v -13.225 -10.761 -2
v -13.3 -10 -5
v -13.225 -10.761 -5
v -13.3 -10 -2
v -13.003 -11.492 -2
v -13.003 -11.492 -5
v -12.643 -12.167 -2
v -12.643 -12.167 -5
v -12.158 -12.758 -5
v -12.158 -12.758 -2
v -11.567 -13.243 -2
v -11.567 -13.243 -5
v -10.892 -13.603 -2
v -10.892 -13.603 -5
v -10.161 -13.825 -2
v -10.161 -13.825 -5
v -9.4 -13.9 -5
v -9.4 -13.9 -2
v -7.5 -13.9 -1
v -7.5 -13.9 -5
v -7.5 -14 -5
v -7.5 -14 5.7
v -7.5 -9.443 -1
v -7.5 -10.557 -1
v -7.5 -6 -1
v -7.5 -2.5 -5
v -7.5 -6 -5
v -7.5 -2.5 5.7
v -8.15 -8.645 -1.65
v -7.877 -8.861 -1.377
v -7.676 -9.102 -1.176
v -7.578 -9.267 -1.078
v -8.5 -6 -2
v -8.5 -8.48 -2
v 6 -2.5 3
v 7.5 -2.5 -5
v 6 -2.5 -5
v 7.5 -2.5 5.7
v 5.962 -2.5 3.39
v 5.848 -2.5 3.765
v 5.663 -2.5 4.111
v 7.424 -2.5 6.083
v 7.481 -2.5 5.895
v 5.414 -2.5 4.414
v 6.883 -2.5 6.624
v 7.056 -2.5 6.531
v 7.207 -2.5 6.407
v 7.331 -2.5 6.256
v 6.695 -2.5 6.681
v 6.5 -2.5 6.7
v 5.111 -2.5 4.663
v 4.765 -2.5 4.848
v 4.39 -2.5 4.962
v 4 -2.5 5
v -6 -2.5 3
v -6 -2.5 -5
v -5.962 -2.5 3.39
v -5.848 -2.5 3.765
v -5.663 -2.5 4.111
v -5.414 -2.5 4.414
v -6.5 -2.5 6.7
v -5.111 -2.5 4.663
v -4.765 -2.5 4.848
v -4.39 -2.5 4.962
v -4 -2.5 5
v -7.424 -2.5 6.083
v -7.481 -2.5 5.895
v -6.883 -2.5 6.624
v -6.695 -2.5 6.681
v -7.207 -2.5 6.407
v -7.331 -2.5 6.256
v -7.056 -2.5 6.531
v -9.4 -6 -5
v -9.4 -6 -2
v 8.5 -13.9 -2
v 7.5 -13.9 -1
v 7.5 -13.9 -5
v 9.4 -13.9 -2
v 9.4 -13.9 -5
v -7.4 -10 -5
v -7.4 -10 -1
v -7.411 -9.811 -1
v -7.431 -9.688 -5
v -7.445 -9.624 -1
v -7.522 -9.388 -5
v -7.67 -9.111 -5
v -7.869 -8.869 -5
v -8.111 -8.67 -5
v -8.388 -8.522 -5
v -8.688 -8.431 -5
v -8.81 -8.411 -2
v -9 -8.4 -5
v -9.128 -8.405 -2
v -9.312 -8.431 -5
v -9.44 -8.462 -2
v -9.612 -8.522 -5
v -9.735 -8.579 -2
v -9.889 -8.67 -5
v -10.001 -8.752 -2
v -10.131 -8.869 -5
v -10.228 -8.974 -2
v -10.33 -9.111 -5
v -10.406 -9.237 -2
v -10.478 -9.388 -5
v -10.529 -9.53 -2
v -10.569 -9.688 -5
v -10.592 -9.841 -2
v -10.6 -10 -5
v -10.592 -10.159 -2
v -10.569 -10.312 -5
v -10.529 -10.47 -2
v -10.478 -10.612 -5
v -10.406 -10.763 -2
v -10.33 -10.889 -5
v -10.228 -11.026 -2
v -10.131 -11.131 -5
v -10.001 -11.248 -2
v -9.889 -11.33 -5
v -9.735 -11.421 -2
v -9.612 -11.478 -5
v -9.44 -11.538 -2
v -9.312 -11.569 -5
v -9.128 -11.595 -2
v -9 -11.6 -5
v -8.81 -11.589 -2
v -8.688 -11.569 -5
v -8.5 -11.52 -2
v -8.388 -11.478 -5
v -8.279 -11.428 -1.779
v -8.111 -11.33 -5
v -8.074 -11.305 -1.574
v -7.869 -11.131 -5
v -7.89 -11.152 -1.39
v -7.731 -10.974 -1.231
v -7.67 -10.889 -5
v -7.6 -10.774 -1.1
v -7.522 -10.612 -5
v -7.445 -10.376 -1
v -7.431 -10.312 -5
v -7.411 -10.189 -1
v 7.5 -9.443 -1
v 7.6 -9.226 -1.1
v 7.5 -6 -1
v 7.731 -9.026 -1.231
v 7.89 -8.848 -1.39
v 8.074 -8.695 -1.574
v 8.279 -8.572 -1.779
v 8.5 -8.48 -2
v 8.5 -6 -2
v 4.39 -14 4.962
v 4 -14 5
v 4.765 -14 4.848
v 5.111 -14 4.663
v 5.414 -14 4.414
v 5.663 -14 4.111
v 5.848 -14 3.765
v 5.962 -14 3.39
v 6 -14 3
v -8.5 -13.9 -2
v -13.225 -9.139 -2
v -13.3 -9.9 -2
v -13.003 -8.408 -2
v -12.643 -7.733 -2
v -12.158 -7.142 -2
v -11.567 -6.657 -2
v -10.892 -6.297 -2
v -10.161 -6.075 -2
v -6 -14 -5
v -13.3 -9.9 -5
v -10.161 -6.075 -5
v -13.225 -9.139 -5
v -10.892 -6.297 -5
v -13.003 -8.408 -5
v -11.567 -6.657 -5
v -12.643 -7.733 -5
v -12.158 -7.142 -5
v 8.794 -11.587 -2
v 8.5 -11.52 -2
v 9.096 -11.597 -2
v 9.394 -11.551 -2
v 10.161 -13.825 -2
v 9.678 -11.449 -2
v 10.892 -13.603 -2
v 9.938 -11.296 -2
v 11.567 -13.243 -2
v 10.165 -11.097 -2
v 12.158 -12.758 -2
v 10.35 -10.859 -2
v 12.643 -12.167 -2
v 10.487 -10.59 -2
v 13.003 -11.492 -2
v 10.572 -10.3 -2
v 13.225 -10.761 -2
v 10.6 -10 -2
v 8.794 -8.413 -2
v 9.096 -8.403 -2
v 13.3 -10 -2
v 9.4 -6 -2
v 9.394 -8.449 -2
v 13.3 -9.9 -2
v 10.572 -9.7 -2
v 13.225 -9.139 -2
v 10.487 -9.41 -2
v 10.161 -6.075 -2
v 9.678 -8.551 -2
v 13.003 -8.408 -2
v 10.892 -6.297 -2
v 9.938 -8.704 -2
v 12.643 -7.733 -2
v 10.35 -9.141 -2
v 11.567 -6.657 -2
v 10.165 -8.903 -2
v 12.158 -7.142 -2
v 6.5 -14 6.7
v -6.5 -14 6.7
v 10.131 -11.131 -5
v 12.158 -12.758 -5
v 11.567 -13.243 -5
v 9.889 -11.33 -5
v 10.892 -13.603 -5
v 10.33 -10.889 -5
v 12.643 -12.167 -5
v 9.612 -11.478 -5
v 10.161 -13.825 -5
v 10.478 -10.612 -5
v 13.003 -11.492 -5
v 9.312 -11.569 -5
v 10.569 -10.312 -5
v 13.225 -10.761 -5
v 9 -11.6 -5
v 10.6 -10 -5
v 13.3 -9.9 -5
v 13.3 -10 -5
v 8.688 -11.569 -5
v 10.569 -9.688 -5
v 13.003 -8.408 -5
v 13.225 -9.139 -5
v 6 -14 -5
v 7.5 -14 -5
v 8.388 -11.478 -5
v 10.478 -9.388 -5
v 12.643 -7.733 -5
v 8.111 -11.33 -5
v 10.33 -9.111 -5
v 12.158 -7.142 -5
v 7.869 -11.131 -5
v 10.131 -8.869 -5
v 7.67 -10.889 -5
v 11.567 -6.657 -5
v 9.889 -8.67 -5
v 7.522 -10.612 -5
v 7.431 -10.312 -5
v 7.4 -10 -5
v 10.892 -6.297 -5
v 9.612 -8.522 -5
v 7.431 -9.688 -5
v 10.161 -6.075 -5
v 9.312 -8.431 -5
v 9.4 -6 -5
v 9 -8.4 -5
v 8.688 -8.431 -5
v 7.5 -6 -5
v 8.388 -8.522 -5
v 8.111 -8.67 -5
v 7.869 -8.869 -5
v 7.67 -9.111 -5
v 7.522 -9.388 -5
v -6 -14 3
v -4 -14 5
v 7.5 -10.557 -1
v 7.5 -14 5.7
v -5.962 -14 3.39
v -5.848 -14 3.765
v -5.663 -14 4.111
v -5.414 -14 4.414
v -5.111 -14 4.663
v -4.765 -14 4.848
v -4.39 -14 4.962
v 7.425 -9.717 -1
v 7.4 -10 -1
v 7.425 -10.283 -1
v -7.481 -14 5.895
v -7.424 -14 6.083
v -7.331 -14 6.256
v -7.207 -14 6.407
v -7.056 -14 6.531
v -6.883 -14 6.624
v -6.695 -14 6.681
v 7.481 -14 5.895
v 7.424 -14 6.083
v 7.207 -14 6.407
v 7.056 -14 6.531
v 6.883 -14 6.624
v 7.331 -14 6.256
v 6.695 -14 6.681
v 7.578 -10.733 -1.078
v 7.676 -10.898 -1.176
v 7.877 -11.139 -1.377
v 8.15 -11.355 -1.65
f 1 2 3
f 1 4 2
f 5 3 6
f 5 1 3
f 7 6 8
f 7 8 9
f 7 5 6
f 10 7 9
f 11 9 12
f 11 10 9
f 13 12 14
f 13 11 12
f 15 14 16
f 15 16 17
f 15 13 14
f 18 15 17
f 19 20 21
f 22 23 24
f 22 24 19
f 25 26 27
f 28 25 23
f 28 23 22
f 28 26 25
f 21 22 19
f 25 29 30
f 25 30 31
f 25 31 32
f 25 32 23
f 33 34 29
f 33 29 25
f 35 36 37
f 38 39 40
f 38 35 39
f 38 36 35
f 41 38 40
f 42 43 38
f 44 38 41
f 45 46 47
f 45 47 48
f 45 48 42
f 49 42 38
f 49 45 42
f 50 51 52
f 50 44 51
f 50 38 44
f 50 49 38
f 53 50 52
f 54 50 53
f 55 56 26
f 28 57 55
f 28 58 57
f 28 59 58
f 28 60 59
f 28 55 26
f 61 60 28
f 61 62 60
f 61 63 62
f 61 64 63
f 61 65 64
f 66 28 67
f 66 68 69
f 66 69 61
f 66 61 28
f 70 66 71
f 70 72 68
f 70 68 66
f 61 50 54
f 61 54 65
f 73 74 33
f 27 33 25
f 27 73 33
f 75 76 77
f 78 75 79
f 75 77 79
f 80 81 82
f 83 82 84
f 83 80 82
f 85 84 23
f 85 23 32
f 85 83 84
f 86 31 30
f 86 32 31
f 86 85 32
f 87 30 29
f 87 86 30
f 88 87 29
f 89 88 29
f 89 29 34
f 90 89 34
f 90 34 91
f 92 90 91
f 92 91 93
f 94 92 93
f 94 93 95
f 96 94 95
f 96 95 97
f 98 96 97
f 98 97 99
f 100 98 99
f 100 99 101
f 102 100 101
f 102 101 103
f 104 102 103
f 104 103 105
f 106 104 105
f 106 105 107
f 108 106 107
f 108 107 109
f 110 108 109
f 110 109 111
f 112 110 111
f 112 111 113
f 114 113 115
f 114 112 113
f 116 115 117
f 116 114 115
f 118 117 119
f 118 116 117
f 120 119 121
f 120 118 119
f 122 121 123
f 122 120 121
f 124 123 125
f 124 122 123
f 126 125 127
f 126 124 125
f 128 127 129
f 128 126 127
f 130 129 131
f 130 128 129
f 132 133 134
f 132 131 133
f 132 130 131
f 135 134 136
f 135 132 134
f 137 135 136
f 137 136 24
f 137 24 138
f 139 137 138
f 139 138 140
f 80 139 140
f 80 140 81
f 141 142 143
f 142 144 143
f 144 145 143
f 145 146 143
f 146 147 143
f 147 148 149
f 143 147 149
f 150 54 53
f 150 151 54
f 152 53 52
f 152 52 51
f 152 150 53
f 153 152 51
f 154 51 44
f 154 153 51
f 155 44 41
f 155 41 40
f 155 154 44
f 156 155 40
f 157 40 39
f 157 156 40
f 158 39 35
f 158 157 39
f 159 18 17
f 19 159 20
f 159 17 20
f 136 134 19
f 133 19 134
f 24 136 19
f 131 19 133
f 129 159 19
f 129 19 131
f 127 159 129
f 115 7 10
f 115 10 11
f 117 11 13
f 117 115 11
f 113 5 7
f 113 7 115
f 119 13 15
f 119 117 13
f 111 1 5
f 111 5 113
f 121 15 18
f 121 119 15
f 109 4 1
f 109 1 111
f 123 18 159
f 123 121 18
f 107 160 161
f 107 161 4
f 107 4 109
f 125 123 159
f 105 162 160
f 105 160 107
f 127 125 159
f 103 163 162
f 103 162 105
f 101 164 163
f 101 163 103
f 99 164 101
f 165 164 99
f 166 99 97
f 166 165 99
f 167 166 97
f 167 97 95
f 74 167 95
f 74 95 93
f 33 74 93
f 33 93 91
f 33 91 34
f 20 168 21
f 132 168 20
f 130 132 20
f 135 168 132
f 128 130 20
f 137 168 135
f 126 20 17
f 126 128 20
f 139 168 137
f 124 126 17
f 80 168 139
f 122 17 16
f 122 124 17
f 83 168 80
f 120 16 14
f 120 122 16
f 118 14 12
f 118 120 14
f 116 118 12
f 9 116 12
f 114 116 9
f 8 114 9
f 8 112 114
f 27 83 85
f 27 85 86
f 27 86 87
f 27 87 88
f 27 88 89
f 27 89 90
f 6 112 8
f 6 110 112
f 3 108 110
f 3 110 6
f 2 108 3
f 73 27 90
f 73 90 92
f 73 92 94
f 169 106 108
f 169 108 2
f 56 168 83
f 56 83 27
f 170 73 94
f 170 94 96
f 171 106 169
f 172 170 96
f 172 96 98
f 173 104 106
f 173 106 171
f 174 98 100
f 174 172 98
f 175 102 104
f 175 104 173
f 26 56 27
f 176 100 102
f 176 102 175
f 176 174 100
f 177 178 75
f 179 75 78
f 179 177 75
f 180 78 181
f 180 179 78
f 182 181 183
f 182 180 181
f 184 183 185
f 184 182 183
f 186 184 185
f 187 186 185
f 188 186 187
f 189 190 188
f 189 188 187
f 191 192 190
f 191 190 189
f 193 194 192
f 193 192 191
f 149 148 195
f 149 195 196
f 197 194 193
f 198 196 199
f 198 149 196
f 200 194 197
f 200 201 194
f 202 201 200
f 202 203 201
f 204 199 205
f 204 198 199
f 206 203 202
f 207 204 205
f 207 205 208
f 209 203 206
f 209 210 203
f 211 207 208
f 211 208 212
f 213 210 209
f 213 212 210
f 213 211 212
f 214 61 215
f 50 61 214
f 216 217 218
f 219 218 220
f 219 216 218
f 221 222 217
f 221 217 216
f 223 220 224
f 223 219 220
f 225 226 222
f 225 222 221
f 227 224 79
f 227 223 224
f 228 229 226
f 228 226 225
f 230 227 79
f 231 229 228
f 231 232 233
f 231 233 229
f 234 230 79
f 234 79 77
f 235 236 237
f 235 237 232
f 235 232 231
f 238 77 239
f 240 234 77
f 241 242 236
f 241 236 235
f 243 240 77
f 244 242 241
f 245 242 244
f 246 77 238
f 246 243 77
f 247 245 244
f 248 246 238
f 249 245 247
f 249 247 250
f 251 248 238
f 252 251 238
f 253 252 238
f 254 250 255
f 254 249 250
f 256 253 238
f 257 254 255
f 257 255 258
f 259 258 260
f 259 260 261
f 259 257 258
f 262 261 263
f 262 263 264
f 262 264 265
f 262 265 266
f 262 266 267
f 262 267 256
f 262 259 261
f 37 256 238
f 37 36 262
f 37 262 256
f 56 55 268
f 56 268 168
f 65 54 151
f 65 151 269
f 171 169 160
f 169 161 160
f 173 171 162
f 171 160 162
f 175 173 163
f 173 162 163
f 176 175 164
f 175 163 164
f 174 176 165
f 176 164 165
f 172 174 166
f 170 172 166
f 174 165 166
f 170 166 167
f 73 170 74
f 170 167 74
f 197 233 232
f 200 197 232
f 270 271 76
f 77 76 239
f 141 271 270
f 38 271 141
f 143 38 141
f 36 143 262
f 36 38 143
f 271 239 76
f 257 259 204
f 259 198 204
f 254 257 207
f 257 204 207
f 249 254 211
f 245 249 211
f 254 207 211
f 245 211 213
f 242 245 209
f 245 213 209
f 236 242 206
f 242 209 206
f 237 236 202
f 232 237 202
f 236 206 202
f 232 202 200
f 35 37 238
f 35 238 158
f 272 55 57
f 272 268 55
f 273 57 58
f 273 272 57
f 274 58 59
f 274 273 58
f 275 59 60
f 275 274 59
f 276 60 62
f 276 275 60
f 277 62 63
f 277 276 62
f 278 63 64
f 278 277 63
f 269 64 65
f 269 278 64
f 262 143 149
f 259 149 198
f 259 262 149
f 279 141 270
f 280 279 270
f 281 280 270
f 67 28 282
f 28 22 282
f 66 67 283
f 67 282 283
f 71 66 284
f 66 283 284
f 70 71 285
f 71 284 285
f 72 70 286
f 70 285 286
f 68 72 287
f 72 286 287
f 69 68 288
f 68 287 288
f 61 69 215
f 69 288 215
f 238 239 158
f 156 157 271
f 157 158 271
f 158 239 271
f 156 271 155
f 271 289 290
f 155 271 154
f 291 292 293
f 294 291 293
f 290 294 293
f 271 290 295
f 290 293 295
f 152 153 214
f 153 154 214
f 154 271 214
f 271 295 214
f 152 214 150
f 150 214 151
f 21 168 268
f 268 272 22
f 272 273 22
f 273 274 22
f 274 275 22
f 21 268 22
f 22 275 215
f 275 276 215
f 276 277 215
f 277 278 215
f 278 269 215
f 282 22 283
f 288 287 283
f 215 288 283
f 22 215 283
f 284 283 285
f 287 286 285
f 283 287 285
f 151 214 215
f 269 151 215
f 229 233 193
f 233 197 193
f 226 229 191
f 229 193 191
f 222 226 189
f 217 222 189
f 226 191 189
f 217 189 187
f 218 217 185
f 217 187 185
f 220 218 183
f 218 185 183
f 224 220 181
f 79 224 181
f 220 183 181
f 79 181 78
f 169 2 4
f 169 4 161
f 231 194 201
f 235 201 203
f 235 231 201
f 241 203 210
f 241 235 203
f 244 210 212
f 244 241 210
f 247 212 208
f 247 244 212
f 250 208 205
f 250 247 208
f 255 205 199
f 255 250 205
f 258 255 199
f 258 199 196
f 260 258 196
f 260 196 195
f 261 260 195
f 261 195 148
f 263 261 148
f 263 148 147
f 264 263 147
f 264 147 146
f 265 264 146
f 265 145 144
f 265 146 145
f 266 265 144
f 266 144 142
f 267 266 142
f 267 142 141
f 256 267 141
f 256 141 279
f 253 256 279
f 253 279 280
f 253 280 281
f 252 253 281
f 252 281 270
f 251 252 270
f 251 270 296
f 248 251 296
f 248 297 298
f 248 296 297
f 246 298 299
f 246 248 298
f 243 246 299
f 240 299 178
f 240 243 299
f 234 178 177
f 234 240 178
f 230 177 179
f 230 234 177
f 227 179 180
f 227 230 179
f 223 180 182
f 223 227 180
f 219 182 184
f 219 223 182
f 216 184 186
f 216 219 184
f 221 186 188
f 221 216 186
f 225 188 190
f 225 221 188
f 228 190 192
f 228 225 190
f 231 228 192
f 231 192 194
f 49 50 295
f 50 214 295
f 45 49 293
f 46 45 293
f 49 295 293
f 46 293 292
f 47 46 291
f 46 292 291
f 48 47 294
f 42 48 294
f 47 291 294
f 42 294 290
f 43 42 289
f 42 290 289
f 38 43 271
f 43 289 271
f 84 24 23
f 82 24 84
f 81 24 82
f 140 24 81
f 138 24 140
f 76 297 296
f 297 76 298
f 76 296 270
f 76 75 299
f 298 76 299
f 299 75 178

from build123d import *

# Parameters (mm, degrees)
PAD012_DEPTH    = 11.5
FILLET001_R     = 1
FILLET002_R     = 2
SKETCH019_W     = 5.8
SKETCH019_H     = 7.9
PAD013_DEPTH    = 3
CHAMFER_SIZE    = 1
FILLET003_R     = 3.9
SKETCH020_R     = 1.6
POCKET006_DEPTH = 4


with BuildPart() as part:
    # Sketch018 (on DatumPlane) → Pad012 (new body)
    with BuildSketch(Plane.XZ.offset(2.5)):
        Polygon((-7.5, -5), (-7.5, 6.7), (7.5, 6.7), (7.5, -5), (6, -5), (6, 5), (-6, 5), (-6, -5), align=None)
    extrude(amount=PAD012_DEPTH)

    # Fillet001
    fillet001_edges = [part.edges().sort_by_distance(p)[0] for p in [
        (-7.5, -8.25, 6.7),
        (7.5, -8.25, 6.7),
    ]]
    fillet(fillet001_edges, radius=FILLET001_R)

    # Fillet002
    fillet002_edges = [part.edges().sort_by_distance(p)[0] for p in [
        (6, -8.25, 5),
        (-6, -8.25, 5),
    ]]
    fillet(fillet002_edges, radius=FILLET002_R)

    # Sketch019 (on DatumPlane) → Pad013 (join)
    with BuildSketch(Plane.XY.offset(-5)):
        with Locations((10.4, -9.95)):
            Rectangle(SKETCH019_W, SKETCH019_H)
        with Locations((-10.4, -9.95)):
            Rectangle(SKETCH019_W, SKETCH019_H)
    extrude(amount=PAD013_DEPTH)

    # Chamfer
    chamfer_edges = [part.edges().sort_by_distance(p)[0] for p in [
        (7.5, -9.95, -2),
        (-7.5, -9.95, -2),
    ]]
    chamfer(chamfer_edges, length=CHAMFER_SIZE)

    # Fillet003
    fillet003_edges = [part.edges().sort_by_distance(p)[0] for p in [
        (13.3, -6, -3.5),
        (13.3, -13.9, -3.5),
        (-13.3, -13.9, -3.5),
        (-13.3, -6, -3.5),
    ]]
    fillet(fillet003_edges, radius=FILLET003_R)

    # Sketch020 (on DatumPlane) → Pocket006 (cut)
    with BuildSketch(Plane.XY.offset(-5)):
        with Locations((-9, -10)):
            Circle(SKETCH020_R)
        with Locations((9, -10)):
            Circle(SKETCH020_R)
    extrude(amount=POCKET006_DEPTH, mode=Mode.SUBTRACT)


solid = part.part
